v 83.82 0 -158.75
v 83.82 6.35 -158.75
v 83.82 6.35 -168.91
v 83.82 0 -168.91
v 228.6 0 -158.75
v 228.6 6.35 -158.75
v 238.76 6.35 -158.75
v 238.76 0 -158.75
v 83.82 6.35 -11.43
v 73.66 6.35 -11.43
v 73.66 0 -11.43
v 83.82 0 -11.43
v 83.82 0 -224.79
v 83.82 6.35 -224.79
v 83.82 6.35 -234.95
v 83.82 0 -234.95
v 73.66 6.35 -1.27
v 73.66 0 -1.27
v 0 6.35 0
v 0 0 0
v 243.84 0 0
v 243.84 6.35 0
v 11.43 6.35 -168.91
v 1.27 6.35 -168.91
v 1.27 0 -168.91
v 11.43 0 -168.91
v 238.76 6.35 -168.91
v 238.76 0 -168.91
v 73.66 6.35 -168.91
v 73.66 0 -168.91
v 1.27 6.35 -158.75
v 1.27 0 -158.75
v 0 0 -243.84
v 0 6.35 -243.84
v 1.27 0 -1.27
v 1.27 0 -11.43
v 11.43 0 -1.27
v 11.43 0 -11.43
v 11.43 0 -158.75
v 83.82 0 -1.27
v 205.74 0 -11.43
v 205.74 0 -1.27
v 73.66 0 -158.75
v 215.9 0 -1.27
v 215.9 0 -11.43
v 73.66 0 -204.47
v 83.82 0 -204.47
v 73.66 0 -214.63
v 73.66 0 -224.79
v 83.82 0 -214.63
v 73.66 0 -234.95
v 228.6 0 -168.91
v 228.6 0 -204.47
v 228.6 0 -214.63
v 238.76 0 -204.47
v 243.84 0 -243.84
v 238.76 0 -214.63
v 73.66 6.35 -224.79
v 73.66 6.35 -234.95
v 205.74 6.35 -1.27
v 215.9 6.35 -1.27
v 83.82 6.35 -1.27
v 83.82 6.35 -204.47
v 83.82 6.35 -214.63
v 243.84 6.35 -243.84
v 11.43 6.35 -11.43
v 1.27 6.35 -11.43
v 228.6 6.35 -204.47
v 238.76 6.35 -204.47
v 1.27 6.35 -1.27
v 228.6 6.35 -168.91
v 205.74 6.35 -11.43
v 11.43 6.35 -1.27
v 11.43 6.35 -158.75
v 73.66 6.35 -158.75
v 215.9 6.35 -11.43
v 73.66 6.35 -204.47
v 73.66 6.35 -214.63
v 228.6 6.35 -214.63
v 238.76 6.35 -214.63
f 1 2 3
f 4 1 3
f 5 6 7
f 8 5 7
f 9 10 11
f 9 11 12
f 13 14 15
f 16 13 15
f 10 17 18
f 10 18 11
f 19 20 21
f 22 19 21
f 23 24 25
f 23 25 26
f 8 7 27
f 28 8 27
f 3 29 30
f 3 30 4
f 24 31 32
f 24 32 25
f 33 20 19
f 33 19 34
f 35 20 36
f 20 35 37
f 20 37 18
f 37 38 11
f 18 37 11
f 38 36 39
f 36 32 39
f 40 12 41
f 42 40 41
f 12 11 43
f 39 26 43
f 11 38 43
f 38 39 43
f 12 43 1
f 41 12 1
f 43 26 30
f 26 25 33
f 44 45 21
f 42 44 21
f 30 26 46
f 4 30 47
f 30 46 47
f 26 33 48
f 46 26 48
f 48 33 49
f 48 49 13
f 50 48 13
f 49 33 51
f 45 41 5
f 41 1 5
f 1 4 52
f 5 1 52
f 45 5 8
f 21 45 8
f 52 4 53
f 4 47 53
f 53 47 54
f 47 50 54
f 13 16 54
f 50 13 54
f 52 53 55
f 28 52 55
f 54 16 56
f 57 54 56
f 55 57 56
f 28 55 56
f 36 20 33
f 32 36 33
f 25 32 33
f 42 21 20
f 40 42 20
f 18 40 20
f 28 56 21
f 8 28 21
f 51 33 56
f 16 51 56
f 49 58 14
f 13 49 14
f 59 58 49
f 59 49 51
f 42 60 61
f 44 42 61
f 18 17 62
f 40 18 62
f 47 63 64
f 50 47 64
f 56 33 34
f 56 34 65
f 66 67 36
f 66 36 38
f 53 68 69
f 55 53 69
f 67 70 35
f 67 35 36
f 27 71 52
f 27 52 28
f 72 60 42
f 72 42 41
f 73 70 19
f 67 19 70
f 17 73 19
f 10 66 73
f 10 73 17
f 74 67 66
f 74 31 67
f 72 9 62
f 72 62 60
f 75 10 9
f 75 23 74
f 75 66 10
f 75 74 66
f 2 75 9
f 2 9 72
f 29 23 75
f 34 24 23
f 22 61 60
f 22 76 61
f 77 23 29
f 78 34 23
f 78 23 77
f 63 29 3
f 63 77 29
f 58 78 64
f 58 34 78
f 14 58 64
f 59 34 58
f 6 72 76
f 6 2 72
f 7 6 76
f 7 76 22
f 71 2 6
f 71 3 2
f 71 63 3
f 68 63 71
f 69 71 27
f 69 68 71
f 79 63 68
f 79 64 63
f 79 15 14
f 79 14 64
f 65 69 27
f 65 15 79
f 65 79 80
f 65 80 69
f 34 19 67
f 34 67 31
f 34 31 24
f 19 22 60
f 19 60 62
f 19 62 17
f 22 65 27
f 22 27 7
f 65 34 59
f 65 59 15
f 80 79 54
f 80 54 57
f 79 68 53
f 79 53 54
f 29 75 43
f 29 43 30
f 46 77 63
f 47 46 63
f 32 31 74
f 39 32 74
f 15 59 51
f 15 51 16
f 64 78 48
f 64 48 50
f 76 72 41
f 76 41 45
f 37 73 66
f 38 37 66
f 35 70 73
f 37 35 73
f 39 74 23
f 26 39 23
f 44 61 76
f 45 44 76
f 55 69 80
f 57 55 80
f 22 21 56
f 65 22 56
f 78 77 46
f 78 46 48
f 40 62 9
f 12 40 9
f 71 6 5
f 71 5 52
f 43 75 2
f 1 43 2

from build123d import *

# Parameters (mm, degrees)
SKETCH1_W           = 243.84
SKETCH1_H           = 243.84
BOSS_EXTRUDE1_DEPTH = 6.35
CUT_EXTRUDE1_REACH  = 346.9
SKETCH5_W           = 10.16
SKETCH5_H           = 10.16


with BuildPart() as part:
    # Sketch1 → Boss-Extrude1 (new body)
    with BuildSketch(Plane(origin=(0, 0, 0), x_dir=(1, 0, 0), z_dir=(0, 1, 0))):
        with Locations((121.92, 121.92)):
            Rectangle(SKETCH1_W, SKETCH1_H)
    extrude(amount=BOSS_EXTRUDE1_DEPTH)

    # Sketch5 → Cut-Extrude1 (cut, up to next)
    with BuildSketch(Plane(origin=(0, 6.35, 0), x_dir=(1, 0, 0), z_dir=(0, 1, 0)), mode=Mode.PRIVATE) as cut_extrude1_sk1:
        with Locations((6.35, 6.35)):
            Rectangle(SKETCH5_W, SKETCH5_H)
    cut_extrude1_tool1 = extrude(cut_extrude1_sk1.sketch, amount=-CUT_EXTRUDE1_REACH, mode=Mode.PRIVATE) & part.part
    # Sketch5 → Cut-Extrude1 (cut, up to next)
    with BuildSketch(Plane(origin=(0, 6.35, 0), x_dir=(1, 0, 0), z_dir=(0, 1, 0)), mode=Mode.PRIVATE) as cut_extrude1_sk2:
        with Locations((78.74, 6.35)):
            Rectangle(SKETCH5_W, SKETCH5_H)
    cut_extrude1_tool2 = extrude(cut_extrude1_sk2.sketch, amount=-CUT_EXTRUDE1_REACH, mode=Mode.PRIVATE) & part.part
    # Sketch5 → Cut-Extrude1 (cut, up to next)
    with BuildSketch(Plane(origin=(0, 6.35, 0), x_dir=(1, 0, 0), z_dir=(0, 1, 0)), mode=Mode.PRIVATE) as cut_extrude1_sk3:
        with Locations((210.82, 6.35)):
            Rectangle(SKETCH5_W, SKETCH5_H)
    cut_extrude1_tool3 = extrude(cut_extrude1_sk3.sketch, amount=-CUT_EXTRUDE1_REACH, mode=Mode.PRIVATE) & part.part
    # Sketch5 → Cut-Extrude1 (cut, up to next)
    with BuildSketch(Plane(origin=(0, 6.35, 0), x_dir=(1, 0, 0), z_dir=(0, 1, 0)), mode=Mode.PRIVATE) as cut_extrude1_sk4:
        with Locations((233.68, 163.83)):
            Rectangle(SKETCH5_W, SKETCH5_H)
    cut_extrude1_tool4 = extrude(cut_extrude1_sk4.sketch, amount=-CUT_EXTRUDE1_REACH, mode=Mode.PRIVATE) & part.part
    # Sketch5 → Cut-Extrude1 (cut, up to next)
    with BuildSketch(Plane(origin=(0, 6.35, 0), x_dir=(1, 0, 0), z_dir=(0, 1, 0)), mode=Mode.PRIVATE) as cut_extrude1_sk5:
        with Locations((233.68, 209.55)):
            Rectangle(SKETCH5_W, SKETCH5_H)
    cut_extrude1_tool5 = extrude(cut_extrude1_sk5.sketch, amount=-CUT_EXTRUDE1_REACH, mode=Mode.PRIVATE) & part.part
    # Sketch5 → Cut-Extrude1 (cut, up to next)
    with BuildSketch(Plane(origin=(0, 6.35, 0), x_dir=(1, 0, 0), z_dir=(0, 1, 0)), mode=Mode.PRIVATE) as cut_extrude1_sk6:
        with Locations((78.74, 209.55)):
            Rectangle(SKETCH5_W, SKETCH5_H)
    cut_extrude1_tool6 = extrude(cut_extrude1_sk6.sketch, amount=-CUT_EXTRUDE1_REACH, mode=Mode.PRIVATE) & part.part
    # Sketch5 → Cut-Extrude1 (cut, up to next)
    with BuildSketch(Plane(origin=(0, 6.35, 0), x_dir=(1, 0, 0), z_dir=(0, 1, 0)), mode=Mode.PRIVATE) as cut_extrude1_sk7:
        with Locations((78.74, 163.83)):
            Rectangle(SKETCH5_W, SKETCH5_H)
    cut_extrude1_tool7 = extrude(cut_extrude1_sk7.sketch, amount=-CUT_EXTRUDE1_REACH, mode=Mode.PRIVATE) & part.part
    # Sketch5 → Cut-Extrude1 (cut, up to next)
    with BuildSketch(Plane(origin=(0, 6.35, 0), x_dir=(1, 0, 0), z_dir=(0, 1, 0)), mode=Mode.PRIVATE) as cut_extrude1_sk8:
        with Locations((6.35, 163.83)):
            Rectangle(SKETCH5_W, SKETCH5_H)
    cut_extrude1_tool8 = extrude(cut_extrude1_sk8.sketch, amount=-CUT_EXTRUDE1_REACH, mode=Mode.PRIVATE) & part.part
    # Sketch5 → Cut-Extrude1 (cut, up to next)
    with BuildSketch(Plane(origin=(0, 6.35, 0), x_dir=(1, 0, 0), z_dir=(0, 1, 0)), mode=Mode.PRIVATE) as cut_extrude1_sk9:
        with Locations((78.74, 229.87)):
            Rectangle(SKETCH5_W, SKETCH5_H)
    cut_extrude1_tool9 = extrude(cut_extrude1_sk9.sketch, amount=-CUT_EXTRUDE1_REACH, mode=Mode.PRIVATE) & part.part
    add(cut_extrude1_tool1.solids().sort_by_distance((6.35, 6.35, -6.35))[0], mode=Mode.SUBTRACT)
    add(cut_extrude1_tool2.solids().sort_by_distance((78.74, 6.35, -6.35))[0], mode=Mode.SUBTRACT)
    add(cut_extrude1_tool3.solids().sort_by_distance((210.82, 6.35, -6.35))[0], mode=Mode.SUBTRACT)
    add(cut_extrude1_tool4.solids().sort_by_distance((233.68, 6.35, -163.83))[0], mode=Mode.SUBTRACT)
    add(cut_extrude1_tool5.solids().sort_by_distance((233.68, 6.35, -209.55))[0], mode=Mode.SUBTRACT)
    add(cut_extrude1_tool6.solids().sort_by_distance((78.74, 6.35, -209.55))[0], mode=Mode.SUBTRACT)
    add(cut_extrude1_tool7.solids().sort_by_distance((78.74, 6.35, -163.83))[0], mode=Mode.SUBTRACT)
    add(cut_extrude1_tool8.solids().sort_by_distance((6.35, 6.35, -163.83))[0], mode=Mode.SUBTRACT)
    add(cut_extrude1_tool9.solids().sort_by_distance((78.74, 6.35, -229.87))[0], mode=Mode.SUBTRACT)


solid = part.part
